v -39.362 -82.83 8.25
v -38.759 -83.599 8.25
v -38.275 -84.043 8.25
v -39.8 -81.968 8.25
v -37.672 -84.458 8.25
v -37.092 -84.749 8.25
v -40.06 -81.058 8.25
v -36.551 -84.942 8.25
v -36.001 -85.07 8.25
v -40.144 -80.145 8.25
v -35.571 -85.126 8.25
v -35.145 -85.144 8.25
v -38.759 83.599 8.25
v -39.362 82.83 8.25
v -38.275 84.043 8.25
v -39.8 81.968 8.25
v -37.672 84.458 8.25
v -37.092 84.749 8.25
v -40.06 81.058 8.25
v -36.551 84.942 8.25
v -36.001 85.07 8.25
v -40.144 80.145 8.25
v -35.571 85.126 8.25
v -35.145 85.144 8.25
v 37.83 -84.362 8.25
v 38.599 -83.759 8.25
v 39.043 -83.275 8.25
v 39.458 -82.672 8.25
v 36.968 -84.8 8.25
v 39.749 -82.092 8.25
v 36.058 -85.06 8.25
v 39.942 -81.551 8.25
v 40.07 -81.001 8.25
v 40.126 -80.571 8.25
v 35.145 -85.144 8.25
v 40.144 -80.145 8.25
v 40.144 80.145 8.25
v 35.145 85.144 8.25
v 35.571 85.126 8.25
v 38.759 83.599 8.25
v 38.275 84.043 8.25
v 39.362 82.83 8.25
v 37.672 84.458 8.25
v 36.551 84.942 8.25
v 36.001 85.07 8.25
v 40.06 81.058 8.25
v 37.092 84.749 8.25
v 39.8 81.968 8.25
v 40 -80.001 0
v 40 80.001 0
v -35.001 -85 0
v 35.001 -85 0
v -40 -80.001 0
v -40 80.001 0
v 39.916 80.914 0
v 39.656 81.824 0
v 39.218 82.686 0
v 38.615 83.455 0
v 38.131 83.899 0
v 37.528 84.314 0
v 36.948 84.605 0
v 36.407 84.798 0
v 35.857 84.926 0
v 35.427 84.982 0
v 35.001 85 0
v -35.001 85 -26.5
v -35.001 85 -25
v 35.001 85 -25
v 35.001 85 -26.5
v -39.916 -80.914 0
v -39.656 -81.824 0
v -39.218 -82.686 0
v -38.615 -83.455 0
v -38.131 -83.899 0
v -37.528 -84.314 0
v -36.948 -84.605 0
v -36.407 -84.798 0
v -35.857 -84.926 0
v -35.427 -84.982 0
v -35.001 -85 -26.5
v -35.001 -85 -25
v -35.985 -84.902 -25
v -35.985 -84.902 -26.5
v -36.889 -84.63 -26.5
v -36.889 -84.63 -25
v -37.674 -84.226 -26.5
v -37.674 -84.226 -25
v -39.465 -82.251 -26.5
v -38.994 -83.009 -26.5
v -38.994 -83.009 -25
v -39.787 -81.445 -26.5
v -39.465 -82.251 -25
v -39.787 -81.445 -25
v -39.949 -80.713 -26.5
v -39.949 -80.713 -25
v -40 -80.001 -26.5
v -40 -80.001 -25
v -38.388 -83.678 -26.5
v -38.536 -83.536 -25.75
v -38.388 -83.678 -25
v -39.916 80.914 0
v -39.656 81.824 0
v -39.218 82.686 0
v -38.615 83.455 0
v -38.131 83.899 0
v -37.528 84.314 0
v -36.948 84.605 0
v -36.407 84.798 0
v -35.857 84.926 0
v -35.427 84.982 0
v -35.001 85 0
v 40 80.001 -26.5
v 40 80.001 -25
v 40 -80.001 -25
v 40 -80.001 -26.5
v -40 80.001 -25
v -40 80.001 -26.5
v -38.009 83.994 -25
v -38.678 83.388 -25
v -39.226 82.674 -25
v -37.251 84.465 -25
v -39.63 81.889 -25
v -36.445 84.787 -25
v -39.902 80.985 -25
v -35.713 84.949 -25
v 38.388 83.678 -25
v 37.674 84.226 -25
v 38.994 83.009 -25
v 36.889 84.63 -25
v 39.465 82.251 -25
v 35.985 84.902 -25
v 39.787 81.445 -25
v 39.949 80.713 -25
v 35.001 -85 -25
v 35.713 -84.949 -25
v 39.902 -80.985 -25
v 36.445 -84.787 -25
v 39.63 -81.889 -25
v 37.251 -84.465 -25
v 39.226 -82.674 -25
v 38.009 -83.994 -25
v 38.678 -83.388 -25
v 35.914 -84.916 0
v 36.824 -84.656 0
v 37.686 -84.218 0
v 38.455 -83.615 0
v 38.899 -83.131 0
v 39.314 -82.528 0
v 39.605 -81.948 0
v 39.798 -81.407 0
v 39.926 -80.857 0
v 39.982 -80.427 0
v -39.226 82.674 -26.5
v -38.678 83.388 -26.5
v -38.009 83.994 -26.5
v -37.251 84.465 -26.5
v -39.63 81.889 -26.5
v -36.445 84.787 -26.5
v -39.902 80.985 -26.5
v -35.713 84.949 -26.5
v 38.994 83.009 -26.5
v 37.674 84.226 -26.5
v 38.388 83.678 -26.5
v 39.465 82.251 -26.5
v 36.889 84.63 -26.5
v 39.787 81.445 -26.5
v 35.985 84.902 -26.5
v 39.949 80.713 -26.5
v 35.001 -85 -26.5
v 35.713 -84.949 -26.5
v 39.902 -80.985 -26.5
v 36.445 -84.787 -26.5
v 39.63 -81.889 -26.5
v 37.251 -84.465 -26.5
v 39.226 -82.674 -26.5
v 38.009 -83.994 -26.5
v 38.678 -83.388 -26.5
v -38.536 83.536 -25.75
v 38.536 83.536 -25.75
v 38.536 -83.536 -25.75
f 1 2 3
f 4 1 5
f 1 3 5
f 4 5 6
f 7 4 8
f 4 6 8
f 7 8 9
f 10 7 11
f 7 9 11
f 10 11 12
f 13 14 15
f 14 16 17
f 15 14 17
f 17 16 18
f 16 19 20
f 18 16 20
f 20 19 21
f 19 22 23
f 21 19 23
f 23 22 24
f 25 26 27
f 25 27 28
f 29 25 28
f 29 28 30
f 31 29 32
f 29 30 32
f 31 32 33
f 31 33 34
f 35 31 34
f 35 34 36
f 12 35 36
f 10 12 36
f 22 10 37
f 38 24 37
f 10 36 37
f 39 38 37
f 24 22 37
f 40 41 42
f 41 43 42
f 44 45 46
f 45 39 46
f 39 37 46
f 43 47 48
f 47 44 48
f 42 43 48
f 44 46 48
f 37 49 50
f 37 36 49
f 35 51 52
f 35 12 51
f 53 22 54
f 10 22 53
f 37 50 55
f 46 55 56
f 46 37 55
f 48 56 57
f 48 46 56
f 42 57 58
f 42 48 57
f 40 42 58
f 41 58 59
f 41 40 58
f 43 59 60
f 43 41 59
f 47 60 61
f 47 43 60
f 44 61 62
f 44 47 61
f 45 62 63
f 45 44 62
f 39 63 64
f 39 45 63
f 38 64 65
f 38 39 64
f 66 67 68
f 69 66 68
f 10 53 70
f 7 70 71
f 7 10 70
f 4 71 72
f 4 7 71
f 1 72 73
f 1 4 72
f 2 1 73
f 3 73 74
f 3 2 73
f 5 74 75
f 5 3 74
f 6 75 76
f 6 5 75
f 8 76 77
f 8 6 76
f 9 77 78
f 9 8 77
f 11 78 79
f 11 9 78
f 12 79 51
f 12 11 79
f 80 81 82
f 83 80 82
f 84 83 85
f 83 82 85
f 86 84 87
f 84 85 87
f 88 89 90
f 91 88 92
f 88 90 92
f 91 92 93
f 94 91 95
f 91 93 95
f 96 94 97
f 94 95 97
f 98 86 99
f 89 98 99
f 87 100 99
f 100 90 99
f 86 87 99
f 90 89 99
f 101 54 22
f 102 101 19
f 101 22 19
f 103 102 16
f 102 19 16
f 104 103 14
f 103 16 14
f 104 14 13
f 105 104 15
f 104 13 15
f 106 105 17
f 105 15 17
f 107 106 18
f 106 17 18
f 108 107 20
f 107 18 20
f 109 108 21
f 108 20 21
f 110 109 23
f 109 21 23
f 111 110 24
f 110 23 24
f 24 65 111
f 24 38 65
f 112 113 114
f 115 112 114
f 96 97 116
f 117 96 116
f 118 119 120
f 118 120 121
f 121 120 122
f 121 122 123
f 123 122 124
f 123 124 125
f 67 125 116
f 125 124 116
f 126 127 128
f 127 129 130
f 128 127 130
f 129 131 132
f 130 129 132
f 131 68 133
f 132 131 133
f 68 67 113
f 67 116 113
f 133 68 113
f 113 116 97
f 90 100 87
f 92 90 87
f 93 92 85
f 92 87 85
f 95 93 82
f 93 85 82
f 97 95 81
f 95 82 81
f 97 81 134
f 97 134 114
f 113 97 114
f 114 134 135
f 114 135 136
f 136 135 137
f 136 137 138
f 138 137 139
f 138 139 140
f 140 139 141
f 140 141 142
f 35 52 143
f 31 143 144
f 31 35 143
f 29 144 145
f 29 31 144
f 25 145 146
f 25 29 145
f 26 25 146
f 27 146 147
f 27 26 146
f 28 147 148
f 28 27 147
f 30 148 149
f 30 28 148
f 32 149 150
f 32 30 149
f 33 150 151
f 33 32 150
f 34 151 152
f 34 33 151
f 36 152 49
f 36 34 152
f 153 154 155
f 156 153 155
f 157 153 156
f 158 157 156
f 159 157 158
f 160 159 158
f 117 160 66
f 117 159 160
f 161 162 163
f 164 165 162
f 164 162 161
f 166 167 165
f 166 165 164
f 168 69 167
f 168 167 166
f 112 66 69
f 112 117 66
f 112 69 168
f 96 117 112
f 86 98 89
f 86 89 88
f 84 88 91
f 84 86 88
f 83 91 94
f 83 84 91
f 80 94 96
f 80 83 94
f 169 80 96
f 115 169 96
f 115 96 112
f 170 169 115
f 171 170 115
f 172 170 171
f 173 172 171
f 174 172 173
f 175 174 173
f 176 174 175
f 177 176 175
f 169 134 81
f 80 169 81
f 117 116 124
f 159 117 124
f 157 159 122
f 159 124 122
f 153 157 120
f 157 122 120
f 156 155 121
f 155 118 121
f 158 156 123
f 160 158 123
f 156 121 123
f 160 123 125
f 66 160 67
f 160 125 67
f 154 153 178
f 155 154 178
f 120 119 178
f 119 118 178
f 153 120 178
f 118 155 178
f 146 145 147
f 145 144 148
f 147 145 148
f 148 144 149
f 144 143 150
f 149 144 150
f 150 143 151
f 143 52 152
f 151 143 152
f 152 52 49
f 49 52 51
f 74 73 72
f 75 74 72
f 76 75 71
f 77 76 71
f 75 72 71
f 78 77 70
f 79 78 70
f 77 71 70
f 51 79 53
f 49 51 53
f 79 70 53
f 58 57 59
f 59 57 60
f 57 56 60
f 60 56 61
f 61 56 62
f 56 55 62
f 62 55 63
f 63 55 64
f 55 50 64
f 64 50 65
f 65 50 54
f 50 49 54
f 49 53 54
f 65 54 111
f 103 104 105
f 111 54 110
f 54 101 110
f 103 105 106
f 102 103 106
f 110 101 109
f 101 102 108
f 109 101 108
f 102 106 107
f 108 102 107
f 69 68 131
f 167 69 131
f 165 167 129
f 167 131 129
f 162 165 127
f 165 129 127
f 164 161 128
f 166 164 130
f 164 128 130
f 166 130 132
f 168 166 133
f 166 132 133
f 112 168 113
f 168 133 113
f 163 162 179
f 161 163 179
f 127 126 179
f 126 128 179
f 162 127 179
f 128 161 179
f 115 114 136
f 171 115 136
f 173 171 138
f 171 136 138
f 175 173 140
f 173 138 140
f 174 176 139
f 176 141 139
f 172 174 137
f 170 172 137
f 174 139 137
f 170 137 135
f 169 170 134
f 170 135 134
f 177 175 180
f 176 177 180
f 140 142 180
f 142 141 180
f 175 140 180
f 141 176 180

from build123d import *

# Parameters (mm, degrees)
F0_W     = 80
F0_H     = 170
F1_DEPTH = 8.25
F1_TAPER = -1
F2_R     = 5
F5_DEPTH = 1.5


with BuildPart() as f1:
    # F0 (on Top) → F1 (new body)
    with BuildSketch(Plane.XY):
        Rectangle(F0_W, F0_H)
    extrude(amount=F1_DEPTH, taper=F1_TAPER)

    # F2
    f2_edges = [f1.edges().sort_by_distance(p)[0] for p in [
        (-40.072002, -85.072002, 4.125),
        (40.072002, -85.072002, 4.125),
        (-40.072002, 85.072002, 4.125),
        (40.072002, 85.072002, 4.125),
    ]]
    fillet(f2_edges, radius=F2_R)


with BuildPart() as f5:
    # F4 (on offset) → F5 (new body)
    with BuildSketch(Plane(origin=(0, 0, -25), x_dir=(1, 0, 0), z_dir=(0, 0, -1))):
        with BuildLine():
            add(Edge.make_bspline(
                [(35.0007615242, -85), (40, -85), (40, -80.0007615242)],
                knots=[2.3563467834, 2.3563467834, 2.3563467834, 3.9268385237, 3.9268385237, 3.9268385237], degree=2, weights=[1, 0.7072144606, 1]))
            Line((40, -80.0007615242), (40, 80.0007615242))
            add(Edge.make_bspline(
                [(40, 80.0007615242), (40, 85), (35.0007615242, 85)],
                knots=[2.3563467834, 2.3563467834, 2.3563467834, 3.9268385237, 3.9268385237, 3.9268385237], degree=2, weights=[1, 0.7072144606, 1]))
            Line((35.0007615242, 85), (-35.0007615242, 85))
            add(Edge.make_bspline(
                [(-35.0007615242, 85), (-40, 85), (-40, 80.0007615242)],
                knots=[2.3563467834, 2.3563467834, 2.3563467834, 3.9268385237, 3.9268385237, 3.9268385237], degree=2, weights=[1, 0.7072144606, 1]))
            Line((-40, 80.0007615242), (-40, -80.0007615242))
            add(Edge.make_bspline(
                [(-40, -80.0007615242), (-40, -85), (-35.0007615242, -85)],
                knots=[2.3563467834, 2.3563467834, 2.3563467834, 3.9268385237, 3.9268385237, 3.9268385237], degree=2, weights=[1, 0.7072144606, 1]))
            Line((-35.0007615242, -85), (35.0007615242, -85))
        make_face()
    extrude(amount=F5_DEPTH)


solid = Compound([f1.part, f5.part])
